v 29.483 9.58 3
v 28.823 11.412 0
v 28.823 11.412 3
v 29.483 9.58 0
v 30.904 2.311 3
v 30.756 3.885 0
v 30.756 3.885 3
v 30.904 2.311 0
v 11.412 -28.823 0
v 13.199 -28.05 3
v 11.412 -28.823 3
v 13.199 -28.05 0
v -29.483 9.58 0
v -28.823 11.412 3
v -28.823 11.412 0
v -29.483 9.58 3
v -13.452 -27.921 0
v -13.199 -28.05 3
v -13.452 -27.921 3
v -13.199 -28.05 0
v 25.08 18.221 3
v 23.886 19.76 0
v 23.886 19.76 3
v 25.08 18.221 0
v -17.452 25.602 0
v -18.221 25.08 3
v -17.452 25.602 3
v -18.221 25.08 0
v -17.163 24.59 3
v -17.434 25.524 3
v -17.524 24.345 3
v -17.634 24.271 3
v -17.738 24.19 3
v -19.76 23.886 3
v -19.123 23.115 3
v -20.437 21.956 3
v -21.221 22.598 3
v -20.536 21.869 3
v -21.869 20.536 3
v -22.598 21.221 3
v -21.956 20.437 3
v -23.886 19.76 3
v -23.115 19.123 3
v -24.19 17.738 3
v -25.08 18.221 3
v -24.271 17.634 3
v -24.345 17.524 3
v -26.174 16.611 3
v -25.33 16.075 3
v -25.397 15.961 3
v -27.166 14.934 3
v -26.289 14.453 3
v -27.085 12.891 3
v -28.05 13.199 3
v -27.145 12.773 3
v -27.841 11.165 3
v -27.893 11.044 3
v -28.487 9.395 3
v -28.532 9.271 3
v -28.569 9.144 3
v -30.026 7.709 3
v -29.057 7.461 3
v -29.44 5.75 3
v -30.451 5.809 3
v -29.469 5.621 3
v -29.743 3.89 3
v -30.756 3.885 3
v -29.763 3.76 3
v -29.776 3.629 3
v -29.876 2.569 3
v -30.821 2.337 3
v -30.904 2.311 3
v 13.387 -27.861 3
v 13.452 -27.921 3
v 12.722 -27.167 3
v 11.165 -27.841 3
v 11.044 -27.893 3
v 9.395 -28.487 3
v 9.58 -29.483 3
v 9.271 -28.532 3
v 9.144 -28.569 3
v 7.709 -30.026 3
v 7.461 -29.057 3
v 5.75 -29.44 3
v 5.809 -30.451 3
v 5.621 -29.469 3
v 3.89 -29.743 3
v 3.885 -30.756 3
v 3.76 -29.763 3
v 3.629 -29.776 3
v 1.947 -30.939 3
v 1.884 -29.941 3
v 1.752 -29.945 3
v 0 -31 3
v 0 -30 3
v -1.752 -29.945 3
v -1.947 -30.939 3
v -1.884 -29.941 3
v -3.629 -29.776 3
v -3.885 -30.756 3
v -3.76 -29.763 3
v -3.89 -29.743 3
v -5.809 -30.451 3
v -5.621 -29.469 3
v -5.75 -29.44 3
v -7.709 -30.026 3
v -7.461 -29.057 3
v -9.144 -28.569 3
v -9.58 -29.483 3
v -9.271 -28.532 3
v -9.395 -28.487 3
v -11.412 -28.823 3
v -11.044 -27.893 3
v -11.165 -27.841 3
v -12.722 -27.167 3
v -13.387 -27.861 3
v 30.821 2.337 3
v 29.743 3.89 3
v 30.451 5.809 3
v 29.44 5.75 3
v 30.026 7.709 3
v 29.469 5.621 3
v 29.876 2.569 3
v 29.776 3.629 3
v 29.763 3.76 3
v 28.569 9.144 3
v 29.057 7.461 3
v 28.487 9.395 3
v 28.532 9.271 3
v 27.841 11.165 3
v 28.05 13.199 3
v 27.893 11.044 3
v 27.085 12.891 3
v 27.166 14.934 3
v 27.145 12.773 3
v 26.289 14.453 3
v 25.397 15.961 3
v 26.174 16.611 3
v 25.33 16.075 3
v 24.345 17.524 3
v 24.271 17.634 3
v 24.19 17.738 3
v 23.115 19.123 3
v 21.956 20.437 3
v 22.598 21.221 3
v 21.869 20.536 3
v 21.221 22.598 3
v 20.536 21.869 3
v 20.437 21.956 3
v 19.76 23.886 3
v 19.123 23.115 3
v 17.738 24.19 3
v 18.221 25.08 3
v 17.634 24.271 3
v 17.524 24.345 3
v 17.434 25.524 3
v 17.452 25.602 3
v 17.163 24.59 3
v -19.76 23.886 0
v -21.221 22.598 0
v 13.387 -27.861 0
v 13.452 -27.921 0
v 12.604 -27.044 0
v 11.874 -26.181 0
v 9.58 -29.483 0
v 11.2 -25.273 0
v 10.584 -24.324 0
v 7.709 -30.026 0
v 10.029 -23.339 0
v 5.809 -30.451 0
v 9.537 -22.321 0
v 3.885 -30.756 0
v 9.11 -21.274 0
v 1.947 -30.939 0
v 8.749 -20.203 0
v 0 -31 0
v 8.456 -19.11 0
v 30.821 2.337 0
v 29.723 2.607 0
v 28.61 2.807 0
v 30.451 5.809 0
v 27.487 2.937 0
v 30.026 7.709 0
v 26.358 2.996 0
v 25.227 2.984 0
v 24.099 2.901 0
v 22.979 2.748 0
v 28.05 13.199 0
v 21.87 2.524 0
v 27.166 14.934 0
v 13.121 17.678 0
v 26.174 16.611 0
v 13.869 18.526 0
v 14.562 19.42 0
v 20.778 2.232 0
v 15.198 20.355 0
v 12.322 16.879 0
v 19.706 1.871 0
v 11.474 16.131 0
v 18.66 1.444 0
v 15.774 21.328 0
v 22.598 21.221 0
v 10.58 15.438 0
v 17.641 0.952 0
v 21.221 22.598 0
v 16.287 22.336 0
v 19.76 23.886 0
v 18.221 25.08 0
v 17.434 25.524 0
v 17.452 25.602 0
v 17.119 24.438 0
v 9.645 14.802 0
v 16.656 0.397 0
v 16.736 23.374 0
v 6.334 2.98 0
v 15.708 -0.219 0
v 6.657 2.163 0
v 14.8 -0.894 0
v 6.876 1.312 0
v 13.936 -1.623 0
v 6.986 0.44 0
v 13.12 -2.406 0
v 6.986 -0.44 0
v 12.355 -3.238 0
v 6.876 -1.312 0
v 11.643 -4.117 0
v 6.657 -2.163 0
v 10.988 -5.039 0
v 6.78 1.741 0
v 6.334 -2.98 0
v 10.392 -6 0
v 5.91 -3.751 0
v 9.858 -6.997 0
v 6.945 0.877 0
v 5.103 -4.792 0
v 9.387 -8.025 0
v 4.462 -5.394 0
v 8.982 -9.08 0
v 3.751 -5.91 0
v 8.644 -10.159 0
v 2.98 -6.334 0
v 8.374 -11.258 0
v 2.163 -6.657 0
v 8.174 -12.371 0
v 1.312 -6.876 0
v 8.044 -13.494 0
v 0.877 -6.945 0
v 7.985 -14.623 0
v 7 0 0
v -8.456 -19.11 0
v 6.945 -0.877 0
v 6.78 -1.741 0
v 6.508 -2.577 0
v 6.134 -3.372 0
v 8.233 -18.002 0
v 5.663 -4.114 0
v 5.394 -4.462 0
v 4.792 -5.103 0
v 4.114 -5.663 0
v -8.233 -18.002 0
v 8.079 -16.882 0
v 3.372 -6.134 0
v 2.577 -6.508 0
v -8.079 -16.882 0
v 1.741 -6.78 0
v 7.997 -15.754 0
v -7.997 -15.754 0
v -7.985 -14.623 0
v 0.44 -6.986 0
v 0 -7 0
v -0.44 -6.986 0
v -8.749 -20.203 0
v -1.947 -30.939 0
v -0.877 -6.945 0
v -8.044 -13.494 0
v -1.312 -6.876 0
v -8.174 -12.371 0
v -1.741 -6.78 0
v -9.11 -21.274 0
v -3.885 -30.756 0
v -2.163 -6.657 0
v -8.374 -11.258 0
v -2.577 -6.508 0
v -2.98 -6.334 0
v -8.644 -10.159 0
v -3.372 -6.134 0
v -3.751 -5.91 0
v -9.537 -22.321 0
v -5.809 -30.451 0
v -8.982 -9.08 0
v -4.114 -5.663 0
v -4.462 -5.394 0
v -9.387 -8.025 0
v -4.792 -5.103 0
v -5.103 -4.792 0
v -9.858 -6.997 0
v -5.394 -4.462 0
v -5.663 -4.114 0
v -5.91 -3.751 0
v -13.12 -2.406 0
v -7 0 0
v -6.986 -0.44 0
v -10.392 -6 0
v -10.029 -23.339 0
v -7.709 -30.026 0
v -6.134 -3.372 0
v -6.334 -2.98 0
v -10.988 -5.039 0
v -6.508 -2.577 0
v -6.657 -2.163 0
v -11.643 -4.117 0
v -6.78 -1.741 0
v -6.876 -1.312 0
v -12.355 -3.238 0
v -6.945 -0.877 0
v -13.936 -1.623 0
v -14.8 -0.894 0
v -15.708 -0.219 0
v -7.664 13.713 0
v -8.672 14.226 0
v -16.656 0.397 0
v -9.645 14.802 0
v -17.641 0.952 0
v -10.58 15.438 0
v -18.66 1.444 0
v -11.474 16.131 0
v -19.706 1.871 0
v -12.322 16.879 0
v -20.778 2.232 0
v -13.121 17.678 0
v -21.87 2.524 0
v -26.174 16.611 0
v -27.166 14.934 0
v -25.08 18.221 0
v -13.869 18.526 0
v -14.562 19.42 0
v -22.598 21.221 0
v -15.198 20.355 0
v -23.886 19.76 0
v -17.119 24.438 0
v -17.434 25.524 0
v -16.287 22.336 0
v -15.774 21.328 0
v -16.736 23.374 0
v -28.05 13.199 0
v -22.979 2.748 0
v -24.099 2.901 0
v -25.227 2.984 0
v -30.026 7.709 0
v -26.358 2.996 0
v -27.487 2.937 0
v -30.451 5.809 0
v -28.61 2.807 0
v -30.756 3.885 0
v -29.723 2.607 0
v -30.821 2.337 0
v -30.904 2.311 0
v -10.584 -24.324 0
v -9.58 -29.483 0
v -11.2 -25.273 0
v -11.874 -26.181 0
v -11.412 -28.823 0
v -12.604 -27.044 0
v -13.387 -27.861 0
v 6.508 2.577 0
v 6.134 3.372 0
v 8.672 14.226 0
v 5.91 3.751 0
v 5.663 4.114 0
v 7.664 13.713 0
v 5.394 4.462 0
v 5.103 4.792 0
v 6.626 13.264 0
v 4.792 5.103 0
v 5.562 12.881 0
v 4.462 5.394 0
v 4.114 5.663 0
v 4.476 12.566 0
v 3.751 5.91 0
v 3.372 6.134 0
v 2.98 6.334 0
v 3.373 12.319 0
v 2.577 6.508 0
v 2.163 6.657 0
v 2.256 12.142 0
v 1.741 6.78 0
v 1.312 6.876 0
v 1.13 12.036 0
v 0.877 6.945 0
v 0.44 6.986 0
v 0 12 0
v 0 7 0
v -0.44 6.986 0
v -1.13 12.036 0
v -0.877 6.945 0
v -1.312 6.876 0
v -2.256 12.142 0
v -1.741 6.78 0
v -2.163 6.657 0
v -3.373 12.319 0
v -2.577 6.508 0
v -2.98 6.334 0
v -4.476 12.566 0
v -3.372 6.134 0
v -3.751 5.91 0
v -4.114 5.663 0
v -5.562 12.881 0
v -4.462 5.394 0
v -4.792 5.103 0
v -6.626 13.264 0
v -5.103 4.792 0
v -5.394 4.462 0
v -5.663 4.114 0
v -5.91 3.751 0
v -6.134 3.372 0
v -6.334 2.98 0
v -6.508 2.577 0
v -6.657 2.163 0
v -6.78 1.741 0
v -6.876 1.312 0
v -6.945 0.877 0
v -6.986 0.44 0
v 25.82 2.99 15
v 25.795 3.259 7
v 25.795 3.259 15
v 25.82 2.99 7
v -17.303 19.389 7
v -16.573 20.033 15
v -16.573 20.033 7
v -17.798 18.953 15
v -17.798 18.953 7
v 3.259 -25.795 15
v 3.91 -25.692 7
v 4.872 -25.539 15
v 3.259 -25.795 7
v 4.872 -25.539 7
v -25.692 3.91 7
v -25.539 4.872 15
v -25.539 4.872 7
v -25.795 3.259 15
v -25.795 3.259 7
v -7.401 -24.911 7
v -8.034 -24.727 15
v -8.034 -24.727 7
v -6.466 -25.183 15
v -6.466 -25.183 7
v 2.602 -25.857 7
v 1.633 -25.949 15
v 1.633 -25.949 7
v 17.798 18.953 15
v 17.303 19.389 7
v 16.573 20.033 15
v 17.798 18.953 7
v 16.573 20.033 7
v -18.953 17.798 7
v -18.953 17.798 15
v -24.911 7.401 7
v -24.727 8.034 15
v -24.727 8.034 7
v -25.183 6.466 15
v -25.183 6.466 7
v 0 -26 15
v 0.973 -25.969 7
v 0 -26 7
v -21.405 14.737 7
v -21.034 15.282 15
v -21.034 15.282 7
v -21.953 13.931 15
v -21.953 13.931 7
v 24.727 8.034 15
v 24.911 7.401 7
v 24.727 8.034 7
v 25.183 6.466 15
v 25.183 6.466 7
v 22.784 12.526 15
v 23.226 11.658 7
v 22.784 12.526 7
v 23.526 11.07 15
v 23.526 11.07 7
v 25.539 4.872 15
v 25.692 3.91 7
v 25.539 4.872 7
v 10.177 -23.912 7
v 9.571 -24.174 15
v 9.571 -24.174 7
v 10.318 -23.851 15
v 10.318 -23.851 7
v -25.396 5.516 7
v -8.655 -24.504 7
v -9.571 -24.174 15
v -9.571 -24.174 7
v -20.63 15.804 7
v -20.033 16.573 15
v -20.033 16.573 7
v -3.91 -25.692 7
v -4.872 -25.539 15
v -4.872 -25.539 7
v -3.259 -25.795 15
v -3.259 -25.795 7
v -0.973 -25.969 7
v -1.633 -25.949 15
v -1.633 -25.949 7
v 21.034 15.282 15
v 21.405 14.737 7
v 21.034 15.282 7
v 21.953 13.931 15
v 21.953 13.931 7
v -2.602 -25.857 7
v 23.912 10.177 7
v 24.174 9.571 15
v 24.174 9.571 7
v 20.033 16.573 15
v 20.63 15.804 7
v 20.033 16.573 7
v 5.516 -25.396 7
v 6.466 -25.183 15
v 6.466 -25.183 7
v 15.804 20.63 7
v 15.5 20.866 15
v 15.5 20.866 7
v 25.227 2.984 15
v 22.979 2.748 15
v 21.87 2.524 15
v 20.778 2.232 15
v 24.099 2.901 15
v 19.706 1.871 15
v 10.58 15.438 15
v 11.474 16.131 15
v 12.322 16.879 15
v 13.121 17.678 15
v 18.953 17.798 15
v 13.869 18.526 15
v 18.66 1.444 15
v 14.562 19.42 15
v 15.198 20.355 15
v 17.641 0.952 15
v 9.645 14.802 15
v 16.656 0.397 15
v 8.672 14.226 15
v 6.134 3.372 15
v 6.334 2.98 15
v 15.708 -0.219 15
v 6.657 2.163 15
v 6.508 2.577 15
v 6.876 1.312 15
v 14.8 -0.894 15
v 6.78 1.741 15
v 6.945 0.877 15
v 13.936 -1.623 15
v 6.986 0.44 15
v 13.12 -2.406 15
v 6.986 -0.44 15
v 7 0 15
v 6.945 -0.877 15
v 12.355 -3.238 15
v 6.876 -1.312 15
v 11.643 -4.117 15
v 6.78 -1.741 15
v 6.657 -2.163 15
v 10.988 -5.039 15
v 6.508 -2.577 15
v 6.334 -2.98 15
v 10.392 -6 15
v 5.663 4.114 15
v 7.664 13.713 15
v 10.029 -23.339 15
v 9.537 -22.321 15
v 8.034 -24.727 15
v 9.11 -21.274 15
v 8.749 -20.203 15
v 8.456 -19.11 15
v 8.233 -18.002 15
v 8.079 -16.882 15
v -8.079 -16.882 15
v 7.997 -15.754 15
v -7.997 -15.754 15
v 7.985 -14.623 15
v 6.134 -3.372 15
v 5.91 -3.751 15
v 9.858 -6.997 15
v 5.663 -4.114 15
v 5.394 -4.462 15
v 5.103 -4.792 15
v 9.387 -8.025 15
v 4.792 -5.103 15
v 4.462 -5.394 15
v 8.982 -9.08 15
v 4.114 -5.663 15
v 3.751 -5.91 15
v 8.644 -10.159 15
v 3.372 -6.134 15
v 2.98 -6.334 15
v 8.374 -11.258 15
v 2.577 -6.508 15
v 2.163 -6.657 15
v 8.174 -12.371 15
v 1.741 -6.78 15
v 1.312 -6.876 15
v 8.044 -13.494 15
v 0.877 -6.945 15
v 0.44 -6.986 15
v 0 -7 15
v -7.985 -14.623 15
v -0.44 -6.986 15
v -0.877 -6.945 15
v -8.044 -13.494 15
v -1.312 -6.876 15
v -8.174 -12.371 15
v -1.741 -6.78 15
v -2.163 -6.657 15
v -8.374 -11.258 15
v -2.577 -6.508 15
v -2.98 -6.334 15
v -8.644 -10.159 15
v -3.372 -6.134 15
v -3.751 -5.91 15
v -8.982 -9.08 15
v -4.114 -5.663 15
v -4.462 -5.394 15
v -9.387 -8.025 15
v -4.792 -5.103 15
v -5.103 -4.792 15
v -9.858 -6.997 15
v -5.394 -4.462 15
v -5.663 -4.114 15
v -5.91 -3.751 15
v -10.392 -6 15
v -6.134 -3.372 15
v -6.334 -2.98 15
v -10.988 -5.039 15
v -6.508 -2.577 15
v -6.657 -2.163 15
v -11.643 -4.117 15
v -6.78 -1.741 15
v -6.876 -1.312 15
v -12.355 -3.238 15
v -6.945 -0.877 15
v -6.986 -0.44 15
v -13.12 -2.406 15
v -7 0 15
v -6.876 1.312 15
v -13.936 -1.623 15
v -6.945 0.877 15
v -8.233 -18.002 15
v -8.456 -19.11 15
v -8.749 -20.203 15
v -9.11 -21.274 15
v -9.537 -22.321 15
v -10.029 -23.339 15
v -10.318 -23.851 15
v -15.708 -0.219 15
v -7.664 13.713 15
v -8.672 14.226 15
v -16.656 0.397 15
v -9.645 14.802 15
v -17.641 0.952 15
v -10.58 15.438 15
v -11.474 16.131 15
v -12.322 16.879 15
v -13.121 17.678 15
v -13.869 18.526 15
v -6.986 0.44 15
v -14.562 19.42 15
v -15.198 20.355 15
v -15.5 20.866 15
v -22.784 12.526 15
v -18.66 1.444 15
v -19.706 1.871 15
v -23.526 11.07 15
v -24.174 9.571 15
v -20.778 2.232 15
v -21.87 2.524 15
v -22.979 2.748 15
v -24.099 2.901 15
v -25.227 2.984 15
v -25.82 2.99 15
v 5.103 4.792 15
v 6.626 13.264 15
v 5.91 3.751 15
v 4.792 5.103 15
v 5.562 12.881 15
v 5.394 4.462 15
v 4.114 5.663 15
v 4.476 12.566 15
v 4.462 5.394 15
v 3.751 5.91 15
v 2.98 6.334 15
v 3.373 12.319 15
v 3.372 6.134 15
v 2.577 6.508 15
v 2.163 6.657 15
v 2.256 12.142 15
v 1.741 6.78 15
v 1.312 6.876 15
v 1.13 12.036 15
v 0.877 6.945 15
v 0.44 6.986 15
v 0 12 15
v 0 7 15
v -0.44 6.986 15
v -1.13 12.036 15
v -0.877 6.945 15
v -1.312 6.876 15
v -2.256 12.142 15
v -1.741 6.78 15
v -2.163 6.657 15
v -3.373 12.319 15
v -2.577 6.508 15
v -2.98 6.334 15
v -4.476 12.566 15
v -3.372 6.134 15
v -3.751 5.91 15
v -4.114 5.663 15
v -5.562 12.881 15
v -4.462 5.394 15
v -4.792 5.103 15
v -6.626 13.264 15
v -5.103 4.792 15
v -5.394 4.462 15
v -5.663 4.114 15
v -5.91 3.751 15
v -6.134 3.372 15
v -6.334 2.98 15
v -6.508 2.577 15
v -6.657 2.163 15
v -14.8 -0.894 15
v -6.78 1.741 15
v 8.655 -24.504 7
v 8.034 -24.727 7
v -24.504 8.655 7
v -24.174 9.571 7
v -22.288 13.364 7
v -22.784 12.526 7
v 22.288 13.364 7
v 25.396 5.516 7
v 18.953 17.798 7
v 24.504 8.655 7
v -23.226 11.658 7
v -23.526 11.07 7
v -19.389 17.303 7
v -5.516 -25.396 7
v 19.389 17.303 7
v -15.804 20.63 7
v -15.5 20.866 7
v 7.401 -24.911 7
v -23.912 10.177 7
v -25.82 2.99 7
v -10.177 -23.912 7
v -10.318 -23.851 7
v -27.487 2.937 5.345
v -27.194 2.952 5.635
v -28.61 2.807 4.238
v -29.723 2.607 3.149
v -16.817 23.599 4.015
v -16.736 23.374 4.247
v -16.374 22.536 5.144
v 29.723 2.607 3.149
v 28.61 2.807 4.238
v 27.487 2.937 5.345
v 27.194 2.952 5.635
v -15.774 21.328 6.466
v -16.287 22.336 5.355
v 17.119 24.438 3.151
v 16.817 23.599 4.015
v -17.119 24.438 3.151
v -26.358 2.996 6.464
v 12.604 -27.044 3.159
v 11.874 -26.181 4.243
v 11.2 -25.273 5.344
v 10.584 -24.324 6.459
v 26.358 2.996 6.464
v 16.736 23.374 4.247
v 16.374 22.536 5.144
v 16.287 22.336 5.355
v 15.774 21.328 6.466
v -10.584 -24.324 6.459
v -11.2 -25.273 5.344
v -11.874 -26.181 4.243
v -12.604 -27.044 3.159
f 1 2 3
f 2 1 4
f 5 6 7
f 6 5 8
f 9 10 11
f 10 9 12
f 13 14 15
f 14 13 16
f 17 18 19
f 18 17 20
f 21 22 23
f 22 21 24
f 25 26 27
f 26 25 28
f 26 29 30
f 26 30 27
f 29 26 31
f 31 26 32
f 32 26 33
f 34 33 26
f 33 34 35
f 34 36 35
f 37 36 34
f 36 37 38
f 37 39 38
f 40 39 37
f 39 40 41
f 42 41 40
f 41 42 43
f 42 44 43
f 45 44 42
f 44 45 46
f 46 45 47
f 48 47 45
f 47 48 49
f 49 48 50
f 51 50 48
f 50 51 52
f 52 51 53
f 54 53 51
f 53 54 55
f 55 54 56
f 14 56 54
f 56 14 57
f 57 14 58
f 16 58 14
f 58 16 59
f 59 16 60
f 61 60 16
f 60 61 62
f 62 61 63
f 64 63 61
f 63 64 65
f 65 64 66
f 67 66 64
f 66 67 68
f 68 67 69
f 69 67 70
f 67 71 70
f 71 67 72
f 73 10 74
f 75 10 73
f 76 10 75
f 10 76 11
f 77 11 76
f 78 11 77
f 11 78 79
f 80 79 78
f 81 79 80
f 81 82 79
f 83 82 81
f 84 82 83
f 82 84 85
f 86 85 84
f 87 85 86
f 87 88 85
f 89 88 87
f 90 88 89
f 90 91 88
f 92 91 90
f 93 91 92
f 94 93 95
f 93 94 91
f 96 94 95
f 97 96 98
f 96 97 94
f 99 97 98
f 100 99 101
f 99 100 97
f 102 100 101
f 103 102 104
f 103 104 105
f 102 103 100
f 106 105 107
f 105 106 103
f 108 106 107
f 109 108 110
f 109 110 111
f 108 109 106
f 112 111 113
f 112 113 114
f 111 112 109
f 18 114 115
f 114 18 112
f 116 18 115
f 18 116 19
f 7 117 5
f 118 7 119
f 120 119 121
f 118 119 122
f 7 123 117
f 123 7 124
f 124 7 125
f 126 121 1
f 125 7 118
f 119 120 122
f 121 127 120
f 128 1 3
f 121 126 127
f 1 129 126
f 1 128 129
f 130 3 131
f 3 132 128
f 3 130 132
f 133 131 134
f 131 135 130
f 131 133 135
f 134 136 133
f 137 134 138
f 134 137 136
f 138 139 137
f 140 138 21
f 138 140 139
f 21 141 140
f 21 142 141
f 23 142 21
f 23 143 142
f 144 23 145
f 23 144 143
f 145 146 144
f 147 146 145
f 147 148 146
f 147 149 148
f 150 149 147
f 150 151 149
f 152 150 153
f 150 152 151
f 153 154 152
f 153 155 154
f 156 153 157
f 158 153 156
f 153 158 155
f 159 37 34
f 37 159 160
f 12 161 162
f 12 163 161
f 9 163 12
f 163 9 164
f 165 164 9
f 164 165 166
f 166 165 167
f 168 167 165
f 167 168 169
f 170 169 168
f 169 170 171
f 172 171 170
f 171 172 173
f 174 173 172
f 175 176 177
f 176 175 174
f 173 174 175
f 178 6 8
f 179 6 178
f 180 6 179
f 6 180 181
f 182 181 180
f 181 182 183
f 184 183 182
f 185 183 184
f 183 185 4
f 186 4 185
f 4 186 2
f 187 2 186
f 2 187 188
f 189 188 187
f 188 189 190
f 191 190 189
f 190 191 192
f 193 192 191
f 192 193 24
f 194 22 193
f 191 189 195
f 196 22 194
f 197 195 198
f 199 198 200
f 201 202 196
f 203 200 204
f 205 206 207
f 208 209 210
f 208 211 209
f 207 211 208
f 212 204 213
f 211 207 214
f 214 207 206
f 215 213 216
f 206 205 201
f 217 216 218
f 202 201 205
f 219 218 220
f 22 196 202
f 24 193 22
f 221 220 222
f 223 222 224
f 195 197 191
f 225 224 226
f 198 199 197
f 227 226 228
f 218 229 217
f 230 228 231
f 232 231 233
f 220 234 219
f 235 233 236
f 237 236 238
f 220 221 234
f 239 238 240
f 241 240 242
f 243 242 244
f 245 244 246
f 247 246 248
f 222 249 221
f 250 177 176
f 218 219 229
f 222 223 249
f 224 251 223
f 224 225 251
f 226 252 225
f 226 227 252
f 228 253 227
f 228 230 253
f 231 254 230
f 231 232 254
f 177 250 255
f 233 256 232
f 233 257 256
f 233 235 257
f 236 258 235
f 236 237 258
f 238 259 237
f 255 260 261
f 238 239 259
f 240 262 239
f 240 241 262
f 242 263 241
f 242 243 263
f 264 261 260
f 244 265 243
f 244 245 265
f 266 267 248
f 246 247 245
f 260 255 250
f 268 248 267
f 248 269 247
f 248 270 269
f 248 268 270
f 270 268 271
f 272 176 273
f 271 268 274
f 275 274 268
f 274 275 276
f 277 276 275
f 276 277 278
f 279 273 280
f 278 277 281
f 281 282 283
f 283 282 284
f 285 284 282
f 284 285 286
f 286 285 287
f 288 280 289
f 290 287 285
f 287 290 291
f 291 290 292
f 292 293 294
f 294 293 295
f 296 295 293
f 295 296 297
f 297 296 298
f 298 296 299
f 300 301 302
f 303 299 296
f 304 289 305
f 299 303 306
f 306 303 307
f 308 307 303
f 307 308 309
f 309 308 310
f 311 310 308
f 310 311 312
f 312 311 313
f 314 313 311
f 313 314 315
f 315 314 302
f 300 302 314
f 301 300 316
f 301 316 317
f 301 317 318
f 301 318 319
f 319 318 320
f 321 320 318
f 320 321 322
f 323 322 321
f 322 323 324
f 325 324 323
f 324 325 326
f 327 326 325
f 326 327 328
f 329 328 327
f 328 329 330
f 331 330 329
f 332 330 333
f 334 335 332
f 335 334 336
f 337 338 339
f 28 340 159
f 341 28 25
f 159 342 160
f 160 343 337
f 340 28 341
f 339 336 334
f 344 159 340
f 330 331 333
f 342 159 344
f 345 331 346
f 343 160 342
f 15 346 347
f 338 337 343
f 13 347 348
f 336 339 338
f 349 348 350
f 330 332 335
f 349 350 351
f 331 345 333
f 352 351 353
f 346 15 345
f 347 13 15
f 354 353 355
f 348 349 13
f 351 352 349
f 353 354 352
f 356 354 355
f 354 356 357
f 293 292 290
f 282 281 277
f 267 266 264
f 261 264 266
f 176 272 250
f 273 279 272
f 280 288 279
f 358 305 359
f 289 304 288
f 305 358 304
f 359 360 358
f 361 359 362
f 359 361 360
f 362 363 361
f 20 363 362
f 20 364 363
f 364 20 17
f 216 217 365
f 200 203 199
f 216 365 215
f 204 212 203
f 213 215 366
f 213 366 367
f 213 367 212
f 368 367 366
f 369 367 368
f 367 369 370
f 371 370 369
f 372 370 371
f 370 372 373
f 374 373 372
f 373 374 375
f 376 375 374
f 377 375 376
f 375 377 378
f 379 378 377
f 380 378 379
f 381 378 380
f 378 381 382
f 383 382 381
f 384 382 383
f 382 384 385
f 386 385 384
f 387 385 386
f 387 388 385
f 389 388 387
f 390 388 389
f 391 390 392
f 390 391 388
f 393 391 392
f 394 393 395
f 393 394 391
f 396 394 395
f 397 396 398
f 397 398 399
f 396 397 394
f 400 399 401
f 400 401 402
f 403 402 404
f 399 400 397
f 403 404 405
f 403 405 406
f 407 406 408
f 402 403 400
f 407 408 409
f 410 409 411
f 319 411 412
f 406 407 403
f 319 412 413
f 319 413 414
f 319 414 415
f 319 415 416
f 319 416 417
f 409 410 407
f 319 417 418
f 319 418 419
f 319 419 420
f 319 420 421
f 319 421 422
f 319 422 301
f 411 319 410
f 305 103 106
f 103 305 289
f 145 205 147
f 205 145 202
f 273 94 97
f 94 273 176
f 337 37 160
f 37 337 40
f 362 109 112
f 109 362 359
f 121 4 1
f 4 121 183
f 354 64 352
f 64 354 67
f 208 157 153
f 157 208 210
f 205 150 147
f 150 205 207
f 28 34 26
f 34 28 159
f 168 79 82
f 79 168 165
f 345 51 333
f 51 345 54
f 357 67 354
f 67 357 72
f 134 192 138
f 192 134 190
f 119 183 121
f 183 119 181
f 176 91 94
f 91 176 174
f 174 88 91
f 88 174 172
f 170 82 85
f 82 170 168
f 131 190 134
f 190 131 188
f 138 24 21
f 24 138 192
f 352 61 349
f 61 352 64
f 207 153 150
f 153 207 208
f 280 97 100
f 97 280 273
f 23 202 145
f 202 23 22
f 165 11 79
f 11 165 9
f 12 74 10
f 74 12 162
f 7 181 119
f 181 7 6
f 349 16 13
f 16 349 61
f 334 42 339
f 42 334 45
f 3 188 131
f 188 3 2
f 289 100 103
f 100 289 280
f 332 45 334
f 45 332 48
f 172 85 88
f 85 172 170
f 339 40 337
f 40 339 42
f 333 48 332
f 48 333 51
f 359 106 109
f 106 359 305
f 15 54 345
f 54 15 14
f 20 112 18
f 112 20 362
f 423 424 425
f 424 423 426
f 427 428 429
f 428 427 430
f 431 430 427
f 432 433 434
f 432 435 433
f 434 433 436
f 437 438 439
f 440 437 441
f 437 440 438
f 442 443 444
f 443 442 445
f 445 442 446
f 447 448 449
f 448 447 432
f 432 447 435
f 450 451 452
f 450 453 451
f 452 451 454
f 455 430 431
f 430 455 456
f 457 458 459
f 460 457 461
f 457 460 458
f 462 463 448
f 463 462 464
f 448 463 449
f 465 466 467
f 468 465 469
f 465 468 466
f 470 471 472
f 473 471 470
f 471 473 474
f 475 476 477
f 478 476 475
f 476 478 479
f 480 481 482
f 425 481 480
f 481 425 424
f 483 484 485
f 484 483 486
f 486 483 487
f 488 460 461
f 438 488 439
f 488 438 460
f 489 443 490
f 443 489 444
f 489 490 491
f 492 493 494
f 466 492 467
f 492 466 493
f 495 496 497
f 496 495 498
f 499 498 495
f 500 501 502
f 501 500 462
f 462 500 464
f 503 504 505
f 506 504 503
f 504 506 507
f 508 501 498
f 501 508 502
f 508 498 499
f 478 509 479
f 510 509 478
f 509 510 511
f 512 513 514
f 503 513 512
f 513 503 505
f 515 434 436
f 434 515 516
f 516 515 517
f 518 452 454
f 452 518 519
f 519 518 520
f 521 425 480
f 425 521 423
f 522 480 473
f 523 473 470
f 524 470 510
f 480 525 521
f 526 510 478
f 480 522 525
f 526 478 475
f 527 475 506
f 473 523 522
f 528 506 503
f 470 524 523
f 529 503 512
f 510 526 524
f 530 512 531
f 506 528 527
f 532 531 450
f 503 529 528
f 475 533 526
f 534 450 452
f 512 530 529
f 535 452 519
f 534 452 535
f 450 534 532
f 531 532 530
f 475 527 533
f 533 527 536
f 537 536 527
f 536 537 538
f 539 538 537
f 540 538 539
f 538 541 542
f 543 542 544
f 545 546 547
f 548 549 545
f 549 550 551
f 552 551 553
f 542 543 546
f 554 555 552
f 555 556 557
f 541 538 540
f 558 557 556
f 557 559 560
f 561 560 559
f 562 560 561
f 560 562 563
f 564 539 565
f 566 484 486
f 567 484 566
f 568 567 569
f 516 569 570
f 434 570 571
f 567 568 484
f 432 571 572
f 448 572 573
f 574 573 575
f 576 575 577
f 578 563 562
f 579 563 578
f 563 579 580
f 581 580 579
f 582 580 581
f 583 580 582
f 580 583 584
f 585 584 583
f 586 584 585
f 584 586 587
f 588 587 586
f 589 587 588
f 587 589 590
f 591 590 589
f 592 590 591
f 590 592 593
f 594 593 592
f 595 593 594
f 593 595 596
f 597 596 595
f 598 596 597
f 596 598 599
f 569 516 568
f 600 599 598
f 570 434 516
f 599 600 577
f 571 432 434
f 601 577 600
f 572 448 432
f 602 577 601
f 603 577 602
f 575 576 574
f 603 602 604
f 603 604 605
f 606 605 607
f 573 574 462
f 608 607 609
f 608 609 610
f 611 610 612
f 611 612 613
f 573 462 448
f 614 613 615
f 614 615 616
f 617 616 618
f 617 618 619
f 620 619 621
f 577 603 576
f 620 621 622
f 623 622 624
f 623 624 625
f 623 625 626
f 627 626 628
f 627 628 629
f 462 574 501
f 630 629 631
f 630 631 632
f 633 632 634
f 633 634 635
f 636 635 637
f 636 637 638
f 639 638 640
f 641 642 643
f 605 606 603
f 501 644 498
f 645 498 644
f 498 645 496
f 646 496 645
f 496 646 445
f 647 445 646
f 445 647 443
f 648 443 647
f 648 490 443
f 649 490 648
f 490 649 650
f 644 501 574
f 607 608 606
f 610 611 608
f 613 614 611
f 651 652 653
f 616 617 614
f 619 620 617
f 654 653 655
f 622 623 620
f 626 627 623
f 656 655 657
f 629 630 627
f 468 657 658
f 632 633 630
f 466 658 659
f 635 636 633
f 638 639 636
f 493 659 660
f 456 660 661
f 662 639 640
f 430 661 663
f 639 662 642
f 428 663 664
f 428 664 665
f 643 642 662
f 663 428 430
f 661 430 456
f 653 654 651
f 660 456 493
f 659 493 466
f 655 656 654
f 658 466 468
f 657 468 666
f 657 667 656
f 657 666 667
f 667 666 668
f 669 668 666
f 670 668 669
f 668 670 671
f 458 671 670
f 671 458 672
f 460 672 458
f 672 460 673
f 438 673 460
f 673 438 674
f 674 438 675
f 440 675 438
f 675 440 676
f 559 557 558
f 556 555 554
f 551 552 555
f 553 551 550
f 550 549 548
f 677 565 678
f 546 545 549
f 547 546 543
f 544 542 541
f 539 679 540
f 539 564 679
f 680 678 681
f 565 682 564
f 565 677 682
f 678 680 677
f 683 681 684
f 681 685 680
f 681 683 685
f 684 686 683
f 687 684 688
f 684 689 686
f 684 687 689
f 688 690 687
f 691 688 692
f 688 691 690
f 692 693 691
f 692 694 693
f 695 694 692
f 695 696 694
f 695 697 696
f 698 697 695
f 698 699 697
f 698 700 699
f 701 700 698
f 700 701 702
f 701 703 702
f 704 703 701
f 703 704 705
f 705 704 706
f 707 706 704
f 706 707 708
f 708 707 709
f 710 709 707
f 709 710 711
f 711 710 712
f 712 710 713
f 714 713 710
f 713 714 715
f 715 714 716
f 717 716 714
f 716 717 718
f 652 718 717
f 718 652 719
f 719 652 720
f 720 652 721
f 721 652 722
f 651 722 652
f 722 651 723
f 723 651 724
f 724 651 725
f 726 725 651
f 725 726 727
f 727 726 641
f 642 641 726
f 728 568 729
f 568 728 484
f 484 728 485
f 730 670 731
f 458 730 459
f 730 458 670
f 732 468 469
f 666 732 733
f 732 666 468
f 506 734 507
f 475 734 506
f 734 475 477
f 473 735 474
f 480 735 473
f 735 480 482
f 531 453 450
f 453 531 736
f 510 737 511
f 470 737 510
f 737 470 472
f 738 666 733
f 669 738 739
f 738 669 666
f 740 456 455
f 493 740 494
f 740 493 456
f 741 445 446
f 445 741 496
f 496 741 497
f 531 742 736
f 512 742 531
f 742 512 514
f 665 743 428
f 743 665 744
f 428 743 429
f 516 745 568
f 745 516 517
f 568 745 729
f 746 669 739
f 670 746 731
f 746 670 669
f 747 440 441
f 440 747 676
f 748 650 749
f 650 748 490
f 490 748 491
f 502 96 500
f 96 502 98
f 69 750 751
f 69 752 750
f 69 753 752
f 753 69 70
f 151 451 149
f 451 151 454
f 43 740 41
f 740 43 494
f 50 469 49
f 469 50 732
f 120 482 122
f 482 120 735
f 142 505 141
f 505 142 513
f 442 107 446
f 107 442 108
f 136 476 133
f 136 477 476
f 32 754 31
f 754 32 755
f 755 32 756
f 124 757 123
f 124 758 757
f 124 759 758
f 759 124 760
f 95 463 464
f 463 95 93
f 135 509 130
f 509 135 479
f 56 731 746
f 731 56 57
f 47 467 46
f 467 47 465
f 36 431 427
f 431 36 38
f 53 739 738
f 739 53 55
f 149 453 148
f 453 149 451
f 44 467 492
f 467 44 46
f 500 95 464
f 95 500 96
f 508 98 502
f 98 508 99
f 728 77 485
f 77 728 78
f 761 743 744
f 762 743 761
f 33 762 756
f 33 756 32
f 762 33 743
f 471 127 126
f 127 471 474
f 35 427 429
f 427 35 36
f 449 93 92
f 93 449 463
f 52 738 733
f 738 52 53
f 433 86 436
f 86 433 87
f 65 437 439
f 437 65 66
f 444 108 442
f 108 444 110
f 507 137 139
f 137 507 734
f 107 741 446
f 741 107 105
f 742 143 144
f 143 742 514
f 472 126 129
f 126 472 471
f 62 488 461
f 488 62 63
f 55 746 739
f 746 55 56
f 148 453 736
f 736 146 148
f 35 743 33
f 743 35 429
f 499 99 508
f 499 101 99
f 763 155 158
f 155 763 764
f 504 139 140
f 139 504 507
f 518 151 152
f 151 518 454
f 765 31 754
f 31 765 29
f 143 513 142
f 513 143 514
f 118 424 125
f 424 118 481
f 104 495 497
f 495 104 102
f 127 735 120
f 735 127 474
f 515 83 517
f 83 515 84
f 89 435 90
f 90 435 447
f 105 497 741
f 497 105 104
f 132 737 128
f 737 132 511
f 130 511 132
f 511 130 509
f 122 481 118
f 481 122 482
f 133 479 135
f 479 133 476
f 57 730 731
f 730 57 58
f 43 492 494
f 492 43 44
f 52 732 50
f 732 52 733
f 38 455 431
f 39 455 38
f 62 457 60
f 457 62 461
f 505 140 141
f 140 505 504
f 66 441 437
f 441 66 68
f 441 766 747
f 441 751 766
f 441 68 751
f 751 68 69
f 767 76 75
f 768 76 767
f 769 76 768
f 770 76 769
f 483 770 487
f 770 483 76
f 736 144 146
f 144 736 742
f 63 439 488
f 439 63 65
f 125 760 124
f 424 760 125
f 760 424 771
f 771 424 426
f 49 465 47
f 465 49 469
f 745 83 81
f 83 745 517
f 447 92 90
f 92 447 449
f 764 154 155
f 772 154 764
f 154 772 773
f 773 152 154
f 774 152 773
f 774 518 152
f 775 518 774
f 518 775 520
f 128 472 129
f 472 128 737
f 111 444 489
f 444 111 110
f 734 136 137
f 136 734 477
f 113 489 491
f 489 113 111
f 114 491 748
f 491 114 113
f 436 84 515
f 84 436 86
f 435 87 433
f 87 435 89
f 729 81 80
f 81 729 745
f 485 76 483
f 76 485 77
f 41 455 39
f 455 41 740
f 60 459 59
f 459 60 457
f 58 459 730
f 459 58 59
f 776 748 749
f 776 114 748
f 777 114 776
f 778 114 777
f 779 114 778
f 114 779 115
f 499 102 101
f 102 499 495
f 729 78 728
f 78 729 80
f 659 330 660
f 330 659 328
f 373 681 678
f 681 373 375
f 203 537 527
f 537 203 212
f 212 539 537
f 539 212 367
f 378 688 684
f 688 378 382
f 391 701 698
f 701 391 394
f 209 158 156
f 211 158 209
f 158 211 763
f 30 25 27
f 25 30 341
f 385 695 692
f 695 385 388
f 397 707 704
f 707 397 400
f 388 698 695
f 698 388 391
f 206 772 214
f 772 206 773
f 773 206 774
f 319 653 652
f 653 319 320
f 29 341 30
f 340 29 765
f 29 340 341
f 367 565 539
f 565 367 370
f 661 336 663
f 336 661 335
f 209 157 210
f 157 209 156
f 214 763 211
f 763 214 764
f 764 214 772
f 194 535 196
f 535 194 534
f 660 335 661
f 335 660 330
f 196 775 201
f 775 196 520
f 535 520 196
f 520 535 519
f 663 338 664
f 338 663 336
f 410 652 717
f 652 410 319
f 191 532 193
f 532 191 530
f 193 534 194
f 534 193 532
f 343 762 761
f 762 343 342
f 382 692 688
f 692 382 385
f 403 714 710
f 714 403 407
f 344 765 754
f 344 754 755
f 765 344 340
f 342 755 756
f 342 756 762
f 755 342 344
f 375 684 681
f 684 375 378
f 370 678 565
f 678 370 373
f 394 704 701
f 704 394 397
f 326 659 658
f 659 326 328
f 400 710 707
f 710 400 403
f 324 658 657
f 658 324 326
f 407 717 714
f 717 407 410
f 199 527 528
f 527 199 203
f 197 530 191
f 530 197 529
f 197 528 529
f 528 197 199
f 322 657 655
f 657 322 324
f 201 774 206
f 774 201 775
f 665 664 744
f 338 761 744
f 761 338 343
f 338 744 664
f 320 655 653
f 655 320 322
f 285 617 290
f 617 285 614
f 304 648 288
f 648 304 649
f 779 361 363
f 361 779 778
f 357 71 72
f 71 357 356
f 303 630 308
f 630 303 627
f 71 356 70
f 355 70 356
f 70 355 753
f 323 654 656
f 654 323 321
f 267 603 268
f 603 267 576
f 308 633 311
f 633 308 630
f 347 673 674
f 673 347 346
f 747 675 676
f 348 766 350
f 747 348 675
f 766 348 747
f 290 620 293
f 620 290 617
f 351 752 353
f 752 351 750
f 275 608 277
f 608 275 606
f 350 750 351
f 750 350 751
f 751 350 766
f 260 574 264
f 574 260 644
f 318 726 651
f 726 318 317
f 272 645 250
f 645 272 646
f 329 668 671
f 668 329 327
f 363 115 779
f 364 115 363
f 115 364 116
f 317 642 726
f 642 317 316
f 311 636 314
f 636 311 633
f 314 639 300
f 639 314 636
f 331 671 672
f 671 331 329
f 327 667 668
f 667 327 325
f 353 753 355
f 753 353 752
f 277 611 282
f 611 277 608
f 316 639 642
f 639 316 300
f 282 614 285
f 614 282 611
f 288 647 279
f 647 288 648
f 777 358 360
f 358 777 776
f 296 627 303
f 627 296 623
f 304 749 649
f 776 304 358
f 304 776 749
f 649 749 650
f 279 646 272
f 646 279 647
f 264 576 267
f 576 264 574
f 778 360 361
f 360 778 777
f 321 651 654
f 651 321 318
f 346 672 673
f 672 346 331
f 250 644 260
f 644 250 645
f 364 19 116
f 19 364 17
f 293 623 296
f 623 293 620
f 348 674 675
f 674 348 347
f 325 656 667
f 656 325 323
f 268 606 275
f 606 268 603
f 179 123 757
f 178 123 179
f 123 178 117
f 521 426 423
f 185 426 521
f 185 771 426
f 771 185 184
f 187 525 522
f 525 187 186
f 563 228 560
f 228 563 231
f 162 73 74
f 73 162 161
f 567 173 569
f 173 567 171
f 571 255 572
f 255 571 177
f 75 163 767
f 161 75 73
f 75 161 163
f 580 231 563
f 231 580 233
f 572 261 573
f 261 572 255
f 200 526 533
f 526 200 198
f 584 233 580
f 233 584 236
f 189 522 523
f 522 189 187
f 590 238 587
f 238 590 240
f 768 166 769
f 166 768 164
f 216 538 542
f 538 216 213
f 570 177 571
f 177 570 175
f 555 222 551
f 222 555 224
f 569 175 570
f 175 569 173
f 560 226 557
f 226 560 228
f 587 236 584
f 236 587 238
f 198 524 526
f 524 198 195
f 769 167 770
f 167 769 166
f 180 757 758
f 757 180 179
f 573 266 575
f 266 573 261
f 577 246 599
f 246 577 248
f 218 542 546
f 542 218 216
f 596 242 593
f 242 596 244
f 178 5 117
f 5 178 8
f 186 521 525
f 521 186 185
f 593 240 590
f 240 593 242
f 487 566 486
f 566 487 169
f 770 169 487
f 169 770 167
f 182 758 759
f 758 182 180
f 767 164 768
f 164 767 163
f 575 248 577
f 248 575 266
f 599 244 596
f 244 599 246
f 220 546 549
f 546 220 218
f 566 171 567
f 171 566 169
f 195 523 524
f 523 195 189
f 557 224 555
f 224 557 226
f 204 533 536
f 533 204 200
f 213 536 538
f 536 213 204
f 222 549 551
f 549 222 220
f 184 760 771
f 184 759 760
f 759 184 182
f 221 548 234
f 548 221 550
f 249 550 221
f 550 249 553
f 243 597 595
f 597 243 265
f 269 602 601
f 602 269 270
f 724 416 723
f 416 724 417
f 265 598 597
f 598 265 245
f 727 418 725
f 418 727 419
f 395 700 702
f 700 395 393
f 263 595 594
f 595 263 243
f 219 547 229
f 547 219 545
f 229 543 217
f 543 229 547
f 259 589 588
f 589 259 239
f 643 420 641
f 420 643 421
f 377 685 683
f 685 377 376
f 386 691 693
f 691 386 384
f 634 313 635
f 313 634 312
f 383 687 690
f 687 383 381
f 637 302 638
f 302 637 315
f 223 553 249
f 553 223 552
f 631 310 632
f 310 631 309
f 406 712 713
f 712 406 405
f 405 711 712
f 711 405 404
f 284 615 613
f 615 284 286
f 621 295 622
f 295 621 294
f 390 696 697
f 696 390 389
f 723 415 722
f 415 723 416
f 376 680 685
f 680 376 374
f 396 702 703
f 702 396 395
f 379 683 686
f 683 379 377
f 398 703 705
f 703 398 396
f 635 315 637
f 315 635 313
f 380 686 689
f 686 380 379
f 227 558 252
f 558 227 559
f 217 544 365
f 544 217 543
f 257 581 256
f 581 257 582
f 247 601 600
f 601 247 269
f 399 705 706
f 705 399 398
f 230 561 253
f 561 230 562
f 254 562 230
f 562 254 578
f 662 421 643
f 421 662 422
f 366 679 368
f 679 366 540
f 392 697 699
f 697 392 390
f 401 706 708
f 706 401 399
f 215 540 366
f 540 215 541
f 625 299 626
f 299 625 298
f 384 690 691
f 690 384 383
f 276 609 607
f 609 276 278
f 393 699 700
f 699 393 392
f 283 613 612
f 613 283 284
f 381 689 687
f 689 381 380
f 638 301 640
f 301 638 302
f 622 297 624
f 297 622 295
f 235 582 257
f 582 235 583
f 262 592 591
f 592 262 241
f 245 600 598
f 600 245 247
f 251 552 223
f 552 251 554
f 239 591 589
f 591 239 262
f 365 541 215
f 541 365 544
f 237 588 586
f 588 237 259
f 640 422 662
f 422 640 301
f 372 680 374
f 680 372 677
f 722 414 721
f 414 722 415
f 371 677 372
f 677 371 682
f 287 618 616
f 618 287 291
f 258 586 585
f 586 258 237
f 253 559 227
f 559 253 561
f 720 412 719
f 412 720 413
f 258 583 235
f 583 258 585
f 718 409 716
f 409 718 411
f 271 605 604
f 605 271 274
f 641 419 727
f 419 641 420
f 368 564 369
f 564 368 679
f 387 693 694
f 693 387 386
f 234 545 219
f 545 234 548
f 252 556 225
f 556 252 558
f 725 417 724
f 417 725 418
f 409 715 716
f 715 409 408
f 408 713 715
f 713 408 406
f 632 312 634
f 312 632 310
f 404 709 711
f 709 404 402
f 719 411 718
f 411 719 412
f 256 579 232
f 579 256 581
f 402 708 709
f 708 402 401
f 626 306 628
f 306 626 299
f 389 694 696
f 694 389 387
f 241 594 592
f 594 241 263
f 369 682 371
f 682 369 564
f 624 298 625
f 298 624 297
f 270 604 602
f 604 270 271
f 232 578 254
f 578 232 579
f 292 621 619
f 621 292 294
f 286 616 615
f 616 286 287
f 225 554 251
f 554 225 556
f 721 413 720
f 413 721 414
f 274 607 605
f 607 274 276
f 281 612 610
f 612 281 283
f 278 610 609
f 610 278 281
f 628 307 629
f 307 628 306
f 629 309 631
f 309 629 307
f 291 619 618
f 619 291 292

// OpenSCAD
$fn=100;

tot_z = 15;
chamfer_z = 10;

difference()
{
	// Solid
	union()
	{
		cylinder((tot_z-chamfer_z-2), 31, 31);
		cylinder(tot_z, 26, 26);
		translate([0, 0, (tot_z-chamfer_z)-3]) cylinder(chamfer_z, 31, 21);
	}

	// Center hole
	translate([0, 0, -1]) cylinder(tot_z+2, 7, 7);

	// 
	for(i = [0:2]) 
	{ 
		rotate([0,0,(360/3)*i]) translate([0,30,-1]) cylinder(tot_z+2, 18, 18);
	}

}
